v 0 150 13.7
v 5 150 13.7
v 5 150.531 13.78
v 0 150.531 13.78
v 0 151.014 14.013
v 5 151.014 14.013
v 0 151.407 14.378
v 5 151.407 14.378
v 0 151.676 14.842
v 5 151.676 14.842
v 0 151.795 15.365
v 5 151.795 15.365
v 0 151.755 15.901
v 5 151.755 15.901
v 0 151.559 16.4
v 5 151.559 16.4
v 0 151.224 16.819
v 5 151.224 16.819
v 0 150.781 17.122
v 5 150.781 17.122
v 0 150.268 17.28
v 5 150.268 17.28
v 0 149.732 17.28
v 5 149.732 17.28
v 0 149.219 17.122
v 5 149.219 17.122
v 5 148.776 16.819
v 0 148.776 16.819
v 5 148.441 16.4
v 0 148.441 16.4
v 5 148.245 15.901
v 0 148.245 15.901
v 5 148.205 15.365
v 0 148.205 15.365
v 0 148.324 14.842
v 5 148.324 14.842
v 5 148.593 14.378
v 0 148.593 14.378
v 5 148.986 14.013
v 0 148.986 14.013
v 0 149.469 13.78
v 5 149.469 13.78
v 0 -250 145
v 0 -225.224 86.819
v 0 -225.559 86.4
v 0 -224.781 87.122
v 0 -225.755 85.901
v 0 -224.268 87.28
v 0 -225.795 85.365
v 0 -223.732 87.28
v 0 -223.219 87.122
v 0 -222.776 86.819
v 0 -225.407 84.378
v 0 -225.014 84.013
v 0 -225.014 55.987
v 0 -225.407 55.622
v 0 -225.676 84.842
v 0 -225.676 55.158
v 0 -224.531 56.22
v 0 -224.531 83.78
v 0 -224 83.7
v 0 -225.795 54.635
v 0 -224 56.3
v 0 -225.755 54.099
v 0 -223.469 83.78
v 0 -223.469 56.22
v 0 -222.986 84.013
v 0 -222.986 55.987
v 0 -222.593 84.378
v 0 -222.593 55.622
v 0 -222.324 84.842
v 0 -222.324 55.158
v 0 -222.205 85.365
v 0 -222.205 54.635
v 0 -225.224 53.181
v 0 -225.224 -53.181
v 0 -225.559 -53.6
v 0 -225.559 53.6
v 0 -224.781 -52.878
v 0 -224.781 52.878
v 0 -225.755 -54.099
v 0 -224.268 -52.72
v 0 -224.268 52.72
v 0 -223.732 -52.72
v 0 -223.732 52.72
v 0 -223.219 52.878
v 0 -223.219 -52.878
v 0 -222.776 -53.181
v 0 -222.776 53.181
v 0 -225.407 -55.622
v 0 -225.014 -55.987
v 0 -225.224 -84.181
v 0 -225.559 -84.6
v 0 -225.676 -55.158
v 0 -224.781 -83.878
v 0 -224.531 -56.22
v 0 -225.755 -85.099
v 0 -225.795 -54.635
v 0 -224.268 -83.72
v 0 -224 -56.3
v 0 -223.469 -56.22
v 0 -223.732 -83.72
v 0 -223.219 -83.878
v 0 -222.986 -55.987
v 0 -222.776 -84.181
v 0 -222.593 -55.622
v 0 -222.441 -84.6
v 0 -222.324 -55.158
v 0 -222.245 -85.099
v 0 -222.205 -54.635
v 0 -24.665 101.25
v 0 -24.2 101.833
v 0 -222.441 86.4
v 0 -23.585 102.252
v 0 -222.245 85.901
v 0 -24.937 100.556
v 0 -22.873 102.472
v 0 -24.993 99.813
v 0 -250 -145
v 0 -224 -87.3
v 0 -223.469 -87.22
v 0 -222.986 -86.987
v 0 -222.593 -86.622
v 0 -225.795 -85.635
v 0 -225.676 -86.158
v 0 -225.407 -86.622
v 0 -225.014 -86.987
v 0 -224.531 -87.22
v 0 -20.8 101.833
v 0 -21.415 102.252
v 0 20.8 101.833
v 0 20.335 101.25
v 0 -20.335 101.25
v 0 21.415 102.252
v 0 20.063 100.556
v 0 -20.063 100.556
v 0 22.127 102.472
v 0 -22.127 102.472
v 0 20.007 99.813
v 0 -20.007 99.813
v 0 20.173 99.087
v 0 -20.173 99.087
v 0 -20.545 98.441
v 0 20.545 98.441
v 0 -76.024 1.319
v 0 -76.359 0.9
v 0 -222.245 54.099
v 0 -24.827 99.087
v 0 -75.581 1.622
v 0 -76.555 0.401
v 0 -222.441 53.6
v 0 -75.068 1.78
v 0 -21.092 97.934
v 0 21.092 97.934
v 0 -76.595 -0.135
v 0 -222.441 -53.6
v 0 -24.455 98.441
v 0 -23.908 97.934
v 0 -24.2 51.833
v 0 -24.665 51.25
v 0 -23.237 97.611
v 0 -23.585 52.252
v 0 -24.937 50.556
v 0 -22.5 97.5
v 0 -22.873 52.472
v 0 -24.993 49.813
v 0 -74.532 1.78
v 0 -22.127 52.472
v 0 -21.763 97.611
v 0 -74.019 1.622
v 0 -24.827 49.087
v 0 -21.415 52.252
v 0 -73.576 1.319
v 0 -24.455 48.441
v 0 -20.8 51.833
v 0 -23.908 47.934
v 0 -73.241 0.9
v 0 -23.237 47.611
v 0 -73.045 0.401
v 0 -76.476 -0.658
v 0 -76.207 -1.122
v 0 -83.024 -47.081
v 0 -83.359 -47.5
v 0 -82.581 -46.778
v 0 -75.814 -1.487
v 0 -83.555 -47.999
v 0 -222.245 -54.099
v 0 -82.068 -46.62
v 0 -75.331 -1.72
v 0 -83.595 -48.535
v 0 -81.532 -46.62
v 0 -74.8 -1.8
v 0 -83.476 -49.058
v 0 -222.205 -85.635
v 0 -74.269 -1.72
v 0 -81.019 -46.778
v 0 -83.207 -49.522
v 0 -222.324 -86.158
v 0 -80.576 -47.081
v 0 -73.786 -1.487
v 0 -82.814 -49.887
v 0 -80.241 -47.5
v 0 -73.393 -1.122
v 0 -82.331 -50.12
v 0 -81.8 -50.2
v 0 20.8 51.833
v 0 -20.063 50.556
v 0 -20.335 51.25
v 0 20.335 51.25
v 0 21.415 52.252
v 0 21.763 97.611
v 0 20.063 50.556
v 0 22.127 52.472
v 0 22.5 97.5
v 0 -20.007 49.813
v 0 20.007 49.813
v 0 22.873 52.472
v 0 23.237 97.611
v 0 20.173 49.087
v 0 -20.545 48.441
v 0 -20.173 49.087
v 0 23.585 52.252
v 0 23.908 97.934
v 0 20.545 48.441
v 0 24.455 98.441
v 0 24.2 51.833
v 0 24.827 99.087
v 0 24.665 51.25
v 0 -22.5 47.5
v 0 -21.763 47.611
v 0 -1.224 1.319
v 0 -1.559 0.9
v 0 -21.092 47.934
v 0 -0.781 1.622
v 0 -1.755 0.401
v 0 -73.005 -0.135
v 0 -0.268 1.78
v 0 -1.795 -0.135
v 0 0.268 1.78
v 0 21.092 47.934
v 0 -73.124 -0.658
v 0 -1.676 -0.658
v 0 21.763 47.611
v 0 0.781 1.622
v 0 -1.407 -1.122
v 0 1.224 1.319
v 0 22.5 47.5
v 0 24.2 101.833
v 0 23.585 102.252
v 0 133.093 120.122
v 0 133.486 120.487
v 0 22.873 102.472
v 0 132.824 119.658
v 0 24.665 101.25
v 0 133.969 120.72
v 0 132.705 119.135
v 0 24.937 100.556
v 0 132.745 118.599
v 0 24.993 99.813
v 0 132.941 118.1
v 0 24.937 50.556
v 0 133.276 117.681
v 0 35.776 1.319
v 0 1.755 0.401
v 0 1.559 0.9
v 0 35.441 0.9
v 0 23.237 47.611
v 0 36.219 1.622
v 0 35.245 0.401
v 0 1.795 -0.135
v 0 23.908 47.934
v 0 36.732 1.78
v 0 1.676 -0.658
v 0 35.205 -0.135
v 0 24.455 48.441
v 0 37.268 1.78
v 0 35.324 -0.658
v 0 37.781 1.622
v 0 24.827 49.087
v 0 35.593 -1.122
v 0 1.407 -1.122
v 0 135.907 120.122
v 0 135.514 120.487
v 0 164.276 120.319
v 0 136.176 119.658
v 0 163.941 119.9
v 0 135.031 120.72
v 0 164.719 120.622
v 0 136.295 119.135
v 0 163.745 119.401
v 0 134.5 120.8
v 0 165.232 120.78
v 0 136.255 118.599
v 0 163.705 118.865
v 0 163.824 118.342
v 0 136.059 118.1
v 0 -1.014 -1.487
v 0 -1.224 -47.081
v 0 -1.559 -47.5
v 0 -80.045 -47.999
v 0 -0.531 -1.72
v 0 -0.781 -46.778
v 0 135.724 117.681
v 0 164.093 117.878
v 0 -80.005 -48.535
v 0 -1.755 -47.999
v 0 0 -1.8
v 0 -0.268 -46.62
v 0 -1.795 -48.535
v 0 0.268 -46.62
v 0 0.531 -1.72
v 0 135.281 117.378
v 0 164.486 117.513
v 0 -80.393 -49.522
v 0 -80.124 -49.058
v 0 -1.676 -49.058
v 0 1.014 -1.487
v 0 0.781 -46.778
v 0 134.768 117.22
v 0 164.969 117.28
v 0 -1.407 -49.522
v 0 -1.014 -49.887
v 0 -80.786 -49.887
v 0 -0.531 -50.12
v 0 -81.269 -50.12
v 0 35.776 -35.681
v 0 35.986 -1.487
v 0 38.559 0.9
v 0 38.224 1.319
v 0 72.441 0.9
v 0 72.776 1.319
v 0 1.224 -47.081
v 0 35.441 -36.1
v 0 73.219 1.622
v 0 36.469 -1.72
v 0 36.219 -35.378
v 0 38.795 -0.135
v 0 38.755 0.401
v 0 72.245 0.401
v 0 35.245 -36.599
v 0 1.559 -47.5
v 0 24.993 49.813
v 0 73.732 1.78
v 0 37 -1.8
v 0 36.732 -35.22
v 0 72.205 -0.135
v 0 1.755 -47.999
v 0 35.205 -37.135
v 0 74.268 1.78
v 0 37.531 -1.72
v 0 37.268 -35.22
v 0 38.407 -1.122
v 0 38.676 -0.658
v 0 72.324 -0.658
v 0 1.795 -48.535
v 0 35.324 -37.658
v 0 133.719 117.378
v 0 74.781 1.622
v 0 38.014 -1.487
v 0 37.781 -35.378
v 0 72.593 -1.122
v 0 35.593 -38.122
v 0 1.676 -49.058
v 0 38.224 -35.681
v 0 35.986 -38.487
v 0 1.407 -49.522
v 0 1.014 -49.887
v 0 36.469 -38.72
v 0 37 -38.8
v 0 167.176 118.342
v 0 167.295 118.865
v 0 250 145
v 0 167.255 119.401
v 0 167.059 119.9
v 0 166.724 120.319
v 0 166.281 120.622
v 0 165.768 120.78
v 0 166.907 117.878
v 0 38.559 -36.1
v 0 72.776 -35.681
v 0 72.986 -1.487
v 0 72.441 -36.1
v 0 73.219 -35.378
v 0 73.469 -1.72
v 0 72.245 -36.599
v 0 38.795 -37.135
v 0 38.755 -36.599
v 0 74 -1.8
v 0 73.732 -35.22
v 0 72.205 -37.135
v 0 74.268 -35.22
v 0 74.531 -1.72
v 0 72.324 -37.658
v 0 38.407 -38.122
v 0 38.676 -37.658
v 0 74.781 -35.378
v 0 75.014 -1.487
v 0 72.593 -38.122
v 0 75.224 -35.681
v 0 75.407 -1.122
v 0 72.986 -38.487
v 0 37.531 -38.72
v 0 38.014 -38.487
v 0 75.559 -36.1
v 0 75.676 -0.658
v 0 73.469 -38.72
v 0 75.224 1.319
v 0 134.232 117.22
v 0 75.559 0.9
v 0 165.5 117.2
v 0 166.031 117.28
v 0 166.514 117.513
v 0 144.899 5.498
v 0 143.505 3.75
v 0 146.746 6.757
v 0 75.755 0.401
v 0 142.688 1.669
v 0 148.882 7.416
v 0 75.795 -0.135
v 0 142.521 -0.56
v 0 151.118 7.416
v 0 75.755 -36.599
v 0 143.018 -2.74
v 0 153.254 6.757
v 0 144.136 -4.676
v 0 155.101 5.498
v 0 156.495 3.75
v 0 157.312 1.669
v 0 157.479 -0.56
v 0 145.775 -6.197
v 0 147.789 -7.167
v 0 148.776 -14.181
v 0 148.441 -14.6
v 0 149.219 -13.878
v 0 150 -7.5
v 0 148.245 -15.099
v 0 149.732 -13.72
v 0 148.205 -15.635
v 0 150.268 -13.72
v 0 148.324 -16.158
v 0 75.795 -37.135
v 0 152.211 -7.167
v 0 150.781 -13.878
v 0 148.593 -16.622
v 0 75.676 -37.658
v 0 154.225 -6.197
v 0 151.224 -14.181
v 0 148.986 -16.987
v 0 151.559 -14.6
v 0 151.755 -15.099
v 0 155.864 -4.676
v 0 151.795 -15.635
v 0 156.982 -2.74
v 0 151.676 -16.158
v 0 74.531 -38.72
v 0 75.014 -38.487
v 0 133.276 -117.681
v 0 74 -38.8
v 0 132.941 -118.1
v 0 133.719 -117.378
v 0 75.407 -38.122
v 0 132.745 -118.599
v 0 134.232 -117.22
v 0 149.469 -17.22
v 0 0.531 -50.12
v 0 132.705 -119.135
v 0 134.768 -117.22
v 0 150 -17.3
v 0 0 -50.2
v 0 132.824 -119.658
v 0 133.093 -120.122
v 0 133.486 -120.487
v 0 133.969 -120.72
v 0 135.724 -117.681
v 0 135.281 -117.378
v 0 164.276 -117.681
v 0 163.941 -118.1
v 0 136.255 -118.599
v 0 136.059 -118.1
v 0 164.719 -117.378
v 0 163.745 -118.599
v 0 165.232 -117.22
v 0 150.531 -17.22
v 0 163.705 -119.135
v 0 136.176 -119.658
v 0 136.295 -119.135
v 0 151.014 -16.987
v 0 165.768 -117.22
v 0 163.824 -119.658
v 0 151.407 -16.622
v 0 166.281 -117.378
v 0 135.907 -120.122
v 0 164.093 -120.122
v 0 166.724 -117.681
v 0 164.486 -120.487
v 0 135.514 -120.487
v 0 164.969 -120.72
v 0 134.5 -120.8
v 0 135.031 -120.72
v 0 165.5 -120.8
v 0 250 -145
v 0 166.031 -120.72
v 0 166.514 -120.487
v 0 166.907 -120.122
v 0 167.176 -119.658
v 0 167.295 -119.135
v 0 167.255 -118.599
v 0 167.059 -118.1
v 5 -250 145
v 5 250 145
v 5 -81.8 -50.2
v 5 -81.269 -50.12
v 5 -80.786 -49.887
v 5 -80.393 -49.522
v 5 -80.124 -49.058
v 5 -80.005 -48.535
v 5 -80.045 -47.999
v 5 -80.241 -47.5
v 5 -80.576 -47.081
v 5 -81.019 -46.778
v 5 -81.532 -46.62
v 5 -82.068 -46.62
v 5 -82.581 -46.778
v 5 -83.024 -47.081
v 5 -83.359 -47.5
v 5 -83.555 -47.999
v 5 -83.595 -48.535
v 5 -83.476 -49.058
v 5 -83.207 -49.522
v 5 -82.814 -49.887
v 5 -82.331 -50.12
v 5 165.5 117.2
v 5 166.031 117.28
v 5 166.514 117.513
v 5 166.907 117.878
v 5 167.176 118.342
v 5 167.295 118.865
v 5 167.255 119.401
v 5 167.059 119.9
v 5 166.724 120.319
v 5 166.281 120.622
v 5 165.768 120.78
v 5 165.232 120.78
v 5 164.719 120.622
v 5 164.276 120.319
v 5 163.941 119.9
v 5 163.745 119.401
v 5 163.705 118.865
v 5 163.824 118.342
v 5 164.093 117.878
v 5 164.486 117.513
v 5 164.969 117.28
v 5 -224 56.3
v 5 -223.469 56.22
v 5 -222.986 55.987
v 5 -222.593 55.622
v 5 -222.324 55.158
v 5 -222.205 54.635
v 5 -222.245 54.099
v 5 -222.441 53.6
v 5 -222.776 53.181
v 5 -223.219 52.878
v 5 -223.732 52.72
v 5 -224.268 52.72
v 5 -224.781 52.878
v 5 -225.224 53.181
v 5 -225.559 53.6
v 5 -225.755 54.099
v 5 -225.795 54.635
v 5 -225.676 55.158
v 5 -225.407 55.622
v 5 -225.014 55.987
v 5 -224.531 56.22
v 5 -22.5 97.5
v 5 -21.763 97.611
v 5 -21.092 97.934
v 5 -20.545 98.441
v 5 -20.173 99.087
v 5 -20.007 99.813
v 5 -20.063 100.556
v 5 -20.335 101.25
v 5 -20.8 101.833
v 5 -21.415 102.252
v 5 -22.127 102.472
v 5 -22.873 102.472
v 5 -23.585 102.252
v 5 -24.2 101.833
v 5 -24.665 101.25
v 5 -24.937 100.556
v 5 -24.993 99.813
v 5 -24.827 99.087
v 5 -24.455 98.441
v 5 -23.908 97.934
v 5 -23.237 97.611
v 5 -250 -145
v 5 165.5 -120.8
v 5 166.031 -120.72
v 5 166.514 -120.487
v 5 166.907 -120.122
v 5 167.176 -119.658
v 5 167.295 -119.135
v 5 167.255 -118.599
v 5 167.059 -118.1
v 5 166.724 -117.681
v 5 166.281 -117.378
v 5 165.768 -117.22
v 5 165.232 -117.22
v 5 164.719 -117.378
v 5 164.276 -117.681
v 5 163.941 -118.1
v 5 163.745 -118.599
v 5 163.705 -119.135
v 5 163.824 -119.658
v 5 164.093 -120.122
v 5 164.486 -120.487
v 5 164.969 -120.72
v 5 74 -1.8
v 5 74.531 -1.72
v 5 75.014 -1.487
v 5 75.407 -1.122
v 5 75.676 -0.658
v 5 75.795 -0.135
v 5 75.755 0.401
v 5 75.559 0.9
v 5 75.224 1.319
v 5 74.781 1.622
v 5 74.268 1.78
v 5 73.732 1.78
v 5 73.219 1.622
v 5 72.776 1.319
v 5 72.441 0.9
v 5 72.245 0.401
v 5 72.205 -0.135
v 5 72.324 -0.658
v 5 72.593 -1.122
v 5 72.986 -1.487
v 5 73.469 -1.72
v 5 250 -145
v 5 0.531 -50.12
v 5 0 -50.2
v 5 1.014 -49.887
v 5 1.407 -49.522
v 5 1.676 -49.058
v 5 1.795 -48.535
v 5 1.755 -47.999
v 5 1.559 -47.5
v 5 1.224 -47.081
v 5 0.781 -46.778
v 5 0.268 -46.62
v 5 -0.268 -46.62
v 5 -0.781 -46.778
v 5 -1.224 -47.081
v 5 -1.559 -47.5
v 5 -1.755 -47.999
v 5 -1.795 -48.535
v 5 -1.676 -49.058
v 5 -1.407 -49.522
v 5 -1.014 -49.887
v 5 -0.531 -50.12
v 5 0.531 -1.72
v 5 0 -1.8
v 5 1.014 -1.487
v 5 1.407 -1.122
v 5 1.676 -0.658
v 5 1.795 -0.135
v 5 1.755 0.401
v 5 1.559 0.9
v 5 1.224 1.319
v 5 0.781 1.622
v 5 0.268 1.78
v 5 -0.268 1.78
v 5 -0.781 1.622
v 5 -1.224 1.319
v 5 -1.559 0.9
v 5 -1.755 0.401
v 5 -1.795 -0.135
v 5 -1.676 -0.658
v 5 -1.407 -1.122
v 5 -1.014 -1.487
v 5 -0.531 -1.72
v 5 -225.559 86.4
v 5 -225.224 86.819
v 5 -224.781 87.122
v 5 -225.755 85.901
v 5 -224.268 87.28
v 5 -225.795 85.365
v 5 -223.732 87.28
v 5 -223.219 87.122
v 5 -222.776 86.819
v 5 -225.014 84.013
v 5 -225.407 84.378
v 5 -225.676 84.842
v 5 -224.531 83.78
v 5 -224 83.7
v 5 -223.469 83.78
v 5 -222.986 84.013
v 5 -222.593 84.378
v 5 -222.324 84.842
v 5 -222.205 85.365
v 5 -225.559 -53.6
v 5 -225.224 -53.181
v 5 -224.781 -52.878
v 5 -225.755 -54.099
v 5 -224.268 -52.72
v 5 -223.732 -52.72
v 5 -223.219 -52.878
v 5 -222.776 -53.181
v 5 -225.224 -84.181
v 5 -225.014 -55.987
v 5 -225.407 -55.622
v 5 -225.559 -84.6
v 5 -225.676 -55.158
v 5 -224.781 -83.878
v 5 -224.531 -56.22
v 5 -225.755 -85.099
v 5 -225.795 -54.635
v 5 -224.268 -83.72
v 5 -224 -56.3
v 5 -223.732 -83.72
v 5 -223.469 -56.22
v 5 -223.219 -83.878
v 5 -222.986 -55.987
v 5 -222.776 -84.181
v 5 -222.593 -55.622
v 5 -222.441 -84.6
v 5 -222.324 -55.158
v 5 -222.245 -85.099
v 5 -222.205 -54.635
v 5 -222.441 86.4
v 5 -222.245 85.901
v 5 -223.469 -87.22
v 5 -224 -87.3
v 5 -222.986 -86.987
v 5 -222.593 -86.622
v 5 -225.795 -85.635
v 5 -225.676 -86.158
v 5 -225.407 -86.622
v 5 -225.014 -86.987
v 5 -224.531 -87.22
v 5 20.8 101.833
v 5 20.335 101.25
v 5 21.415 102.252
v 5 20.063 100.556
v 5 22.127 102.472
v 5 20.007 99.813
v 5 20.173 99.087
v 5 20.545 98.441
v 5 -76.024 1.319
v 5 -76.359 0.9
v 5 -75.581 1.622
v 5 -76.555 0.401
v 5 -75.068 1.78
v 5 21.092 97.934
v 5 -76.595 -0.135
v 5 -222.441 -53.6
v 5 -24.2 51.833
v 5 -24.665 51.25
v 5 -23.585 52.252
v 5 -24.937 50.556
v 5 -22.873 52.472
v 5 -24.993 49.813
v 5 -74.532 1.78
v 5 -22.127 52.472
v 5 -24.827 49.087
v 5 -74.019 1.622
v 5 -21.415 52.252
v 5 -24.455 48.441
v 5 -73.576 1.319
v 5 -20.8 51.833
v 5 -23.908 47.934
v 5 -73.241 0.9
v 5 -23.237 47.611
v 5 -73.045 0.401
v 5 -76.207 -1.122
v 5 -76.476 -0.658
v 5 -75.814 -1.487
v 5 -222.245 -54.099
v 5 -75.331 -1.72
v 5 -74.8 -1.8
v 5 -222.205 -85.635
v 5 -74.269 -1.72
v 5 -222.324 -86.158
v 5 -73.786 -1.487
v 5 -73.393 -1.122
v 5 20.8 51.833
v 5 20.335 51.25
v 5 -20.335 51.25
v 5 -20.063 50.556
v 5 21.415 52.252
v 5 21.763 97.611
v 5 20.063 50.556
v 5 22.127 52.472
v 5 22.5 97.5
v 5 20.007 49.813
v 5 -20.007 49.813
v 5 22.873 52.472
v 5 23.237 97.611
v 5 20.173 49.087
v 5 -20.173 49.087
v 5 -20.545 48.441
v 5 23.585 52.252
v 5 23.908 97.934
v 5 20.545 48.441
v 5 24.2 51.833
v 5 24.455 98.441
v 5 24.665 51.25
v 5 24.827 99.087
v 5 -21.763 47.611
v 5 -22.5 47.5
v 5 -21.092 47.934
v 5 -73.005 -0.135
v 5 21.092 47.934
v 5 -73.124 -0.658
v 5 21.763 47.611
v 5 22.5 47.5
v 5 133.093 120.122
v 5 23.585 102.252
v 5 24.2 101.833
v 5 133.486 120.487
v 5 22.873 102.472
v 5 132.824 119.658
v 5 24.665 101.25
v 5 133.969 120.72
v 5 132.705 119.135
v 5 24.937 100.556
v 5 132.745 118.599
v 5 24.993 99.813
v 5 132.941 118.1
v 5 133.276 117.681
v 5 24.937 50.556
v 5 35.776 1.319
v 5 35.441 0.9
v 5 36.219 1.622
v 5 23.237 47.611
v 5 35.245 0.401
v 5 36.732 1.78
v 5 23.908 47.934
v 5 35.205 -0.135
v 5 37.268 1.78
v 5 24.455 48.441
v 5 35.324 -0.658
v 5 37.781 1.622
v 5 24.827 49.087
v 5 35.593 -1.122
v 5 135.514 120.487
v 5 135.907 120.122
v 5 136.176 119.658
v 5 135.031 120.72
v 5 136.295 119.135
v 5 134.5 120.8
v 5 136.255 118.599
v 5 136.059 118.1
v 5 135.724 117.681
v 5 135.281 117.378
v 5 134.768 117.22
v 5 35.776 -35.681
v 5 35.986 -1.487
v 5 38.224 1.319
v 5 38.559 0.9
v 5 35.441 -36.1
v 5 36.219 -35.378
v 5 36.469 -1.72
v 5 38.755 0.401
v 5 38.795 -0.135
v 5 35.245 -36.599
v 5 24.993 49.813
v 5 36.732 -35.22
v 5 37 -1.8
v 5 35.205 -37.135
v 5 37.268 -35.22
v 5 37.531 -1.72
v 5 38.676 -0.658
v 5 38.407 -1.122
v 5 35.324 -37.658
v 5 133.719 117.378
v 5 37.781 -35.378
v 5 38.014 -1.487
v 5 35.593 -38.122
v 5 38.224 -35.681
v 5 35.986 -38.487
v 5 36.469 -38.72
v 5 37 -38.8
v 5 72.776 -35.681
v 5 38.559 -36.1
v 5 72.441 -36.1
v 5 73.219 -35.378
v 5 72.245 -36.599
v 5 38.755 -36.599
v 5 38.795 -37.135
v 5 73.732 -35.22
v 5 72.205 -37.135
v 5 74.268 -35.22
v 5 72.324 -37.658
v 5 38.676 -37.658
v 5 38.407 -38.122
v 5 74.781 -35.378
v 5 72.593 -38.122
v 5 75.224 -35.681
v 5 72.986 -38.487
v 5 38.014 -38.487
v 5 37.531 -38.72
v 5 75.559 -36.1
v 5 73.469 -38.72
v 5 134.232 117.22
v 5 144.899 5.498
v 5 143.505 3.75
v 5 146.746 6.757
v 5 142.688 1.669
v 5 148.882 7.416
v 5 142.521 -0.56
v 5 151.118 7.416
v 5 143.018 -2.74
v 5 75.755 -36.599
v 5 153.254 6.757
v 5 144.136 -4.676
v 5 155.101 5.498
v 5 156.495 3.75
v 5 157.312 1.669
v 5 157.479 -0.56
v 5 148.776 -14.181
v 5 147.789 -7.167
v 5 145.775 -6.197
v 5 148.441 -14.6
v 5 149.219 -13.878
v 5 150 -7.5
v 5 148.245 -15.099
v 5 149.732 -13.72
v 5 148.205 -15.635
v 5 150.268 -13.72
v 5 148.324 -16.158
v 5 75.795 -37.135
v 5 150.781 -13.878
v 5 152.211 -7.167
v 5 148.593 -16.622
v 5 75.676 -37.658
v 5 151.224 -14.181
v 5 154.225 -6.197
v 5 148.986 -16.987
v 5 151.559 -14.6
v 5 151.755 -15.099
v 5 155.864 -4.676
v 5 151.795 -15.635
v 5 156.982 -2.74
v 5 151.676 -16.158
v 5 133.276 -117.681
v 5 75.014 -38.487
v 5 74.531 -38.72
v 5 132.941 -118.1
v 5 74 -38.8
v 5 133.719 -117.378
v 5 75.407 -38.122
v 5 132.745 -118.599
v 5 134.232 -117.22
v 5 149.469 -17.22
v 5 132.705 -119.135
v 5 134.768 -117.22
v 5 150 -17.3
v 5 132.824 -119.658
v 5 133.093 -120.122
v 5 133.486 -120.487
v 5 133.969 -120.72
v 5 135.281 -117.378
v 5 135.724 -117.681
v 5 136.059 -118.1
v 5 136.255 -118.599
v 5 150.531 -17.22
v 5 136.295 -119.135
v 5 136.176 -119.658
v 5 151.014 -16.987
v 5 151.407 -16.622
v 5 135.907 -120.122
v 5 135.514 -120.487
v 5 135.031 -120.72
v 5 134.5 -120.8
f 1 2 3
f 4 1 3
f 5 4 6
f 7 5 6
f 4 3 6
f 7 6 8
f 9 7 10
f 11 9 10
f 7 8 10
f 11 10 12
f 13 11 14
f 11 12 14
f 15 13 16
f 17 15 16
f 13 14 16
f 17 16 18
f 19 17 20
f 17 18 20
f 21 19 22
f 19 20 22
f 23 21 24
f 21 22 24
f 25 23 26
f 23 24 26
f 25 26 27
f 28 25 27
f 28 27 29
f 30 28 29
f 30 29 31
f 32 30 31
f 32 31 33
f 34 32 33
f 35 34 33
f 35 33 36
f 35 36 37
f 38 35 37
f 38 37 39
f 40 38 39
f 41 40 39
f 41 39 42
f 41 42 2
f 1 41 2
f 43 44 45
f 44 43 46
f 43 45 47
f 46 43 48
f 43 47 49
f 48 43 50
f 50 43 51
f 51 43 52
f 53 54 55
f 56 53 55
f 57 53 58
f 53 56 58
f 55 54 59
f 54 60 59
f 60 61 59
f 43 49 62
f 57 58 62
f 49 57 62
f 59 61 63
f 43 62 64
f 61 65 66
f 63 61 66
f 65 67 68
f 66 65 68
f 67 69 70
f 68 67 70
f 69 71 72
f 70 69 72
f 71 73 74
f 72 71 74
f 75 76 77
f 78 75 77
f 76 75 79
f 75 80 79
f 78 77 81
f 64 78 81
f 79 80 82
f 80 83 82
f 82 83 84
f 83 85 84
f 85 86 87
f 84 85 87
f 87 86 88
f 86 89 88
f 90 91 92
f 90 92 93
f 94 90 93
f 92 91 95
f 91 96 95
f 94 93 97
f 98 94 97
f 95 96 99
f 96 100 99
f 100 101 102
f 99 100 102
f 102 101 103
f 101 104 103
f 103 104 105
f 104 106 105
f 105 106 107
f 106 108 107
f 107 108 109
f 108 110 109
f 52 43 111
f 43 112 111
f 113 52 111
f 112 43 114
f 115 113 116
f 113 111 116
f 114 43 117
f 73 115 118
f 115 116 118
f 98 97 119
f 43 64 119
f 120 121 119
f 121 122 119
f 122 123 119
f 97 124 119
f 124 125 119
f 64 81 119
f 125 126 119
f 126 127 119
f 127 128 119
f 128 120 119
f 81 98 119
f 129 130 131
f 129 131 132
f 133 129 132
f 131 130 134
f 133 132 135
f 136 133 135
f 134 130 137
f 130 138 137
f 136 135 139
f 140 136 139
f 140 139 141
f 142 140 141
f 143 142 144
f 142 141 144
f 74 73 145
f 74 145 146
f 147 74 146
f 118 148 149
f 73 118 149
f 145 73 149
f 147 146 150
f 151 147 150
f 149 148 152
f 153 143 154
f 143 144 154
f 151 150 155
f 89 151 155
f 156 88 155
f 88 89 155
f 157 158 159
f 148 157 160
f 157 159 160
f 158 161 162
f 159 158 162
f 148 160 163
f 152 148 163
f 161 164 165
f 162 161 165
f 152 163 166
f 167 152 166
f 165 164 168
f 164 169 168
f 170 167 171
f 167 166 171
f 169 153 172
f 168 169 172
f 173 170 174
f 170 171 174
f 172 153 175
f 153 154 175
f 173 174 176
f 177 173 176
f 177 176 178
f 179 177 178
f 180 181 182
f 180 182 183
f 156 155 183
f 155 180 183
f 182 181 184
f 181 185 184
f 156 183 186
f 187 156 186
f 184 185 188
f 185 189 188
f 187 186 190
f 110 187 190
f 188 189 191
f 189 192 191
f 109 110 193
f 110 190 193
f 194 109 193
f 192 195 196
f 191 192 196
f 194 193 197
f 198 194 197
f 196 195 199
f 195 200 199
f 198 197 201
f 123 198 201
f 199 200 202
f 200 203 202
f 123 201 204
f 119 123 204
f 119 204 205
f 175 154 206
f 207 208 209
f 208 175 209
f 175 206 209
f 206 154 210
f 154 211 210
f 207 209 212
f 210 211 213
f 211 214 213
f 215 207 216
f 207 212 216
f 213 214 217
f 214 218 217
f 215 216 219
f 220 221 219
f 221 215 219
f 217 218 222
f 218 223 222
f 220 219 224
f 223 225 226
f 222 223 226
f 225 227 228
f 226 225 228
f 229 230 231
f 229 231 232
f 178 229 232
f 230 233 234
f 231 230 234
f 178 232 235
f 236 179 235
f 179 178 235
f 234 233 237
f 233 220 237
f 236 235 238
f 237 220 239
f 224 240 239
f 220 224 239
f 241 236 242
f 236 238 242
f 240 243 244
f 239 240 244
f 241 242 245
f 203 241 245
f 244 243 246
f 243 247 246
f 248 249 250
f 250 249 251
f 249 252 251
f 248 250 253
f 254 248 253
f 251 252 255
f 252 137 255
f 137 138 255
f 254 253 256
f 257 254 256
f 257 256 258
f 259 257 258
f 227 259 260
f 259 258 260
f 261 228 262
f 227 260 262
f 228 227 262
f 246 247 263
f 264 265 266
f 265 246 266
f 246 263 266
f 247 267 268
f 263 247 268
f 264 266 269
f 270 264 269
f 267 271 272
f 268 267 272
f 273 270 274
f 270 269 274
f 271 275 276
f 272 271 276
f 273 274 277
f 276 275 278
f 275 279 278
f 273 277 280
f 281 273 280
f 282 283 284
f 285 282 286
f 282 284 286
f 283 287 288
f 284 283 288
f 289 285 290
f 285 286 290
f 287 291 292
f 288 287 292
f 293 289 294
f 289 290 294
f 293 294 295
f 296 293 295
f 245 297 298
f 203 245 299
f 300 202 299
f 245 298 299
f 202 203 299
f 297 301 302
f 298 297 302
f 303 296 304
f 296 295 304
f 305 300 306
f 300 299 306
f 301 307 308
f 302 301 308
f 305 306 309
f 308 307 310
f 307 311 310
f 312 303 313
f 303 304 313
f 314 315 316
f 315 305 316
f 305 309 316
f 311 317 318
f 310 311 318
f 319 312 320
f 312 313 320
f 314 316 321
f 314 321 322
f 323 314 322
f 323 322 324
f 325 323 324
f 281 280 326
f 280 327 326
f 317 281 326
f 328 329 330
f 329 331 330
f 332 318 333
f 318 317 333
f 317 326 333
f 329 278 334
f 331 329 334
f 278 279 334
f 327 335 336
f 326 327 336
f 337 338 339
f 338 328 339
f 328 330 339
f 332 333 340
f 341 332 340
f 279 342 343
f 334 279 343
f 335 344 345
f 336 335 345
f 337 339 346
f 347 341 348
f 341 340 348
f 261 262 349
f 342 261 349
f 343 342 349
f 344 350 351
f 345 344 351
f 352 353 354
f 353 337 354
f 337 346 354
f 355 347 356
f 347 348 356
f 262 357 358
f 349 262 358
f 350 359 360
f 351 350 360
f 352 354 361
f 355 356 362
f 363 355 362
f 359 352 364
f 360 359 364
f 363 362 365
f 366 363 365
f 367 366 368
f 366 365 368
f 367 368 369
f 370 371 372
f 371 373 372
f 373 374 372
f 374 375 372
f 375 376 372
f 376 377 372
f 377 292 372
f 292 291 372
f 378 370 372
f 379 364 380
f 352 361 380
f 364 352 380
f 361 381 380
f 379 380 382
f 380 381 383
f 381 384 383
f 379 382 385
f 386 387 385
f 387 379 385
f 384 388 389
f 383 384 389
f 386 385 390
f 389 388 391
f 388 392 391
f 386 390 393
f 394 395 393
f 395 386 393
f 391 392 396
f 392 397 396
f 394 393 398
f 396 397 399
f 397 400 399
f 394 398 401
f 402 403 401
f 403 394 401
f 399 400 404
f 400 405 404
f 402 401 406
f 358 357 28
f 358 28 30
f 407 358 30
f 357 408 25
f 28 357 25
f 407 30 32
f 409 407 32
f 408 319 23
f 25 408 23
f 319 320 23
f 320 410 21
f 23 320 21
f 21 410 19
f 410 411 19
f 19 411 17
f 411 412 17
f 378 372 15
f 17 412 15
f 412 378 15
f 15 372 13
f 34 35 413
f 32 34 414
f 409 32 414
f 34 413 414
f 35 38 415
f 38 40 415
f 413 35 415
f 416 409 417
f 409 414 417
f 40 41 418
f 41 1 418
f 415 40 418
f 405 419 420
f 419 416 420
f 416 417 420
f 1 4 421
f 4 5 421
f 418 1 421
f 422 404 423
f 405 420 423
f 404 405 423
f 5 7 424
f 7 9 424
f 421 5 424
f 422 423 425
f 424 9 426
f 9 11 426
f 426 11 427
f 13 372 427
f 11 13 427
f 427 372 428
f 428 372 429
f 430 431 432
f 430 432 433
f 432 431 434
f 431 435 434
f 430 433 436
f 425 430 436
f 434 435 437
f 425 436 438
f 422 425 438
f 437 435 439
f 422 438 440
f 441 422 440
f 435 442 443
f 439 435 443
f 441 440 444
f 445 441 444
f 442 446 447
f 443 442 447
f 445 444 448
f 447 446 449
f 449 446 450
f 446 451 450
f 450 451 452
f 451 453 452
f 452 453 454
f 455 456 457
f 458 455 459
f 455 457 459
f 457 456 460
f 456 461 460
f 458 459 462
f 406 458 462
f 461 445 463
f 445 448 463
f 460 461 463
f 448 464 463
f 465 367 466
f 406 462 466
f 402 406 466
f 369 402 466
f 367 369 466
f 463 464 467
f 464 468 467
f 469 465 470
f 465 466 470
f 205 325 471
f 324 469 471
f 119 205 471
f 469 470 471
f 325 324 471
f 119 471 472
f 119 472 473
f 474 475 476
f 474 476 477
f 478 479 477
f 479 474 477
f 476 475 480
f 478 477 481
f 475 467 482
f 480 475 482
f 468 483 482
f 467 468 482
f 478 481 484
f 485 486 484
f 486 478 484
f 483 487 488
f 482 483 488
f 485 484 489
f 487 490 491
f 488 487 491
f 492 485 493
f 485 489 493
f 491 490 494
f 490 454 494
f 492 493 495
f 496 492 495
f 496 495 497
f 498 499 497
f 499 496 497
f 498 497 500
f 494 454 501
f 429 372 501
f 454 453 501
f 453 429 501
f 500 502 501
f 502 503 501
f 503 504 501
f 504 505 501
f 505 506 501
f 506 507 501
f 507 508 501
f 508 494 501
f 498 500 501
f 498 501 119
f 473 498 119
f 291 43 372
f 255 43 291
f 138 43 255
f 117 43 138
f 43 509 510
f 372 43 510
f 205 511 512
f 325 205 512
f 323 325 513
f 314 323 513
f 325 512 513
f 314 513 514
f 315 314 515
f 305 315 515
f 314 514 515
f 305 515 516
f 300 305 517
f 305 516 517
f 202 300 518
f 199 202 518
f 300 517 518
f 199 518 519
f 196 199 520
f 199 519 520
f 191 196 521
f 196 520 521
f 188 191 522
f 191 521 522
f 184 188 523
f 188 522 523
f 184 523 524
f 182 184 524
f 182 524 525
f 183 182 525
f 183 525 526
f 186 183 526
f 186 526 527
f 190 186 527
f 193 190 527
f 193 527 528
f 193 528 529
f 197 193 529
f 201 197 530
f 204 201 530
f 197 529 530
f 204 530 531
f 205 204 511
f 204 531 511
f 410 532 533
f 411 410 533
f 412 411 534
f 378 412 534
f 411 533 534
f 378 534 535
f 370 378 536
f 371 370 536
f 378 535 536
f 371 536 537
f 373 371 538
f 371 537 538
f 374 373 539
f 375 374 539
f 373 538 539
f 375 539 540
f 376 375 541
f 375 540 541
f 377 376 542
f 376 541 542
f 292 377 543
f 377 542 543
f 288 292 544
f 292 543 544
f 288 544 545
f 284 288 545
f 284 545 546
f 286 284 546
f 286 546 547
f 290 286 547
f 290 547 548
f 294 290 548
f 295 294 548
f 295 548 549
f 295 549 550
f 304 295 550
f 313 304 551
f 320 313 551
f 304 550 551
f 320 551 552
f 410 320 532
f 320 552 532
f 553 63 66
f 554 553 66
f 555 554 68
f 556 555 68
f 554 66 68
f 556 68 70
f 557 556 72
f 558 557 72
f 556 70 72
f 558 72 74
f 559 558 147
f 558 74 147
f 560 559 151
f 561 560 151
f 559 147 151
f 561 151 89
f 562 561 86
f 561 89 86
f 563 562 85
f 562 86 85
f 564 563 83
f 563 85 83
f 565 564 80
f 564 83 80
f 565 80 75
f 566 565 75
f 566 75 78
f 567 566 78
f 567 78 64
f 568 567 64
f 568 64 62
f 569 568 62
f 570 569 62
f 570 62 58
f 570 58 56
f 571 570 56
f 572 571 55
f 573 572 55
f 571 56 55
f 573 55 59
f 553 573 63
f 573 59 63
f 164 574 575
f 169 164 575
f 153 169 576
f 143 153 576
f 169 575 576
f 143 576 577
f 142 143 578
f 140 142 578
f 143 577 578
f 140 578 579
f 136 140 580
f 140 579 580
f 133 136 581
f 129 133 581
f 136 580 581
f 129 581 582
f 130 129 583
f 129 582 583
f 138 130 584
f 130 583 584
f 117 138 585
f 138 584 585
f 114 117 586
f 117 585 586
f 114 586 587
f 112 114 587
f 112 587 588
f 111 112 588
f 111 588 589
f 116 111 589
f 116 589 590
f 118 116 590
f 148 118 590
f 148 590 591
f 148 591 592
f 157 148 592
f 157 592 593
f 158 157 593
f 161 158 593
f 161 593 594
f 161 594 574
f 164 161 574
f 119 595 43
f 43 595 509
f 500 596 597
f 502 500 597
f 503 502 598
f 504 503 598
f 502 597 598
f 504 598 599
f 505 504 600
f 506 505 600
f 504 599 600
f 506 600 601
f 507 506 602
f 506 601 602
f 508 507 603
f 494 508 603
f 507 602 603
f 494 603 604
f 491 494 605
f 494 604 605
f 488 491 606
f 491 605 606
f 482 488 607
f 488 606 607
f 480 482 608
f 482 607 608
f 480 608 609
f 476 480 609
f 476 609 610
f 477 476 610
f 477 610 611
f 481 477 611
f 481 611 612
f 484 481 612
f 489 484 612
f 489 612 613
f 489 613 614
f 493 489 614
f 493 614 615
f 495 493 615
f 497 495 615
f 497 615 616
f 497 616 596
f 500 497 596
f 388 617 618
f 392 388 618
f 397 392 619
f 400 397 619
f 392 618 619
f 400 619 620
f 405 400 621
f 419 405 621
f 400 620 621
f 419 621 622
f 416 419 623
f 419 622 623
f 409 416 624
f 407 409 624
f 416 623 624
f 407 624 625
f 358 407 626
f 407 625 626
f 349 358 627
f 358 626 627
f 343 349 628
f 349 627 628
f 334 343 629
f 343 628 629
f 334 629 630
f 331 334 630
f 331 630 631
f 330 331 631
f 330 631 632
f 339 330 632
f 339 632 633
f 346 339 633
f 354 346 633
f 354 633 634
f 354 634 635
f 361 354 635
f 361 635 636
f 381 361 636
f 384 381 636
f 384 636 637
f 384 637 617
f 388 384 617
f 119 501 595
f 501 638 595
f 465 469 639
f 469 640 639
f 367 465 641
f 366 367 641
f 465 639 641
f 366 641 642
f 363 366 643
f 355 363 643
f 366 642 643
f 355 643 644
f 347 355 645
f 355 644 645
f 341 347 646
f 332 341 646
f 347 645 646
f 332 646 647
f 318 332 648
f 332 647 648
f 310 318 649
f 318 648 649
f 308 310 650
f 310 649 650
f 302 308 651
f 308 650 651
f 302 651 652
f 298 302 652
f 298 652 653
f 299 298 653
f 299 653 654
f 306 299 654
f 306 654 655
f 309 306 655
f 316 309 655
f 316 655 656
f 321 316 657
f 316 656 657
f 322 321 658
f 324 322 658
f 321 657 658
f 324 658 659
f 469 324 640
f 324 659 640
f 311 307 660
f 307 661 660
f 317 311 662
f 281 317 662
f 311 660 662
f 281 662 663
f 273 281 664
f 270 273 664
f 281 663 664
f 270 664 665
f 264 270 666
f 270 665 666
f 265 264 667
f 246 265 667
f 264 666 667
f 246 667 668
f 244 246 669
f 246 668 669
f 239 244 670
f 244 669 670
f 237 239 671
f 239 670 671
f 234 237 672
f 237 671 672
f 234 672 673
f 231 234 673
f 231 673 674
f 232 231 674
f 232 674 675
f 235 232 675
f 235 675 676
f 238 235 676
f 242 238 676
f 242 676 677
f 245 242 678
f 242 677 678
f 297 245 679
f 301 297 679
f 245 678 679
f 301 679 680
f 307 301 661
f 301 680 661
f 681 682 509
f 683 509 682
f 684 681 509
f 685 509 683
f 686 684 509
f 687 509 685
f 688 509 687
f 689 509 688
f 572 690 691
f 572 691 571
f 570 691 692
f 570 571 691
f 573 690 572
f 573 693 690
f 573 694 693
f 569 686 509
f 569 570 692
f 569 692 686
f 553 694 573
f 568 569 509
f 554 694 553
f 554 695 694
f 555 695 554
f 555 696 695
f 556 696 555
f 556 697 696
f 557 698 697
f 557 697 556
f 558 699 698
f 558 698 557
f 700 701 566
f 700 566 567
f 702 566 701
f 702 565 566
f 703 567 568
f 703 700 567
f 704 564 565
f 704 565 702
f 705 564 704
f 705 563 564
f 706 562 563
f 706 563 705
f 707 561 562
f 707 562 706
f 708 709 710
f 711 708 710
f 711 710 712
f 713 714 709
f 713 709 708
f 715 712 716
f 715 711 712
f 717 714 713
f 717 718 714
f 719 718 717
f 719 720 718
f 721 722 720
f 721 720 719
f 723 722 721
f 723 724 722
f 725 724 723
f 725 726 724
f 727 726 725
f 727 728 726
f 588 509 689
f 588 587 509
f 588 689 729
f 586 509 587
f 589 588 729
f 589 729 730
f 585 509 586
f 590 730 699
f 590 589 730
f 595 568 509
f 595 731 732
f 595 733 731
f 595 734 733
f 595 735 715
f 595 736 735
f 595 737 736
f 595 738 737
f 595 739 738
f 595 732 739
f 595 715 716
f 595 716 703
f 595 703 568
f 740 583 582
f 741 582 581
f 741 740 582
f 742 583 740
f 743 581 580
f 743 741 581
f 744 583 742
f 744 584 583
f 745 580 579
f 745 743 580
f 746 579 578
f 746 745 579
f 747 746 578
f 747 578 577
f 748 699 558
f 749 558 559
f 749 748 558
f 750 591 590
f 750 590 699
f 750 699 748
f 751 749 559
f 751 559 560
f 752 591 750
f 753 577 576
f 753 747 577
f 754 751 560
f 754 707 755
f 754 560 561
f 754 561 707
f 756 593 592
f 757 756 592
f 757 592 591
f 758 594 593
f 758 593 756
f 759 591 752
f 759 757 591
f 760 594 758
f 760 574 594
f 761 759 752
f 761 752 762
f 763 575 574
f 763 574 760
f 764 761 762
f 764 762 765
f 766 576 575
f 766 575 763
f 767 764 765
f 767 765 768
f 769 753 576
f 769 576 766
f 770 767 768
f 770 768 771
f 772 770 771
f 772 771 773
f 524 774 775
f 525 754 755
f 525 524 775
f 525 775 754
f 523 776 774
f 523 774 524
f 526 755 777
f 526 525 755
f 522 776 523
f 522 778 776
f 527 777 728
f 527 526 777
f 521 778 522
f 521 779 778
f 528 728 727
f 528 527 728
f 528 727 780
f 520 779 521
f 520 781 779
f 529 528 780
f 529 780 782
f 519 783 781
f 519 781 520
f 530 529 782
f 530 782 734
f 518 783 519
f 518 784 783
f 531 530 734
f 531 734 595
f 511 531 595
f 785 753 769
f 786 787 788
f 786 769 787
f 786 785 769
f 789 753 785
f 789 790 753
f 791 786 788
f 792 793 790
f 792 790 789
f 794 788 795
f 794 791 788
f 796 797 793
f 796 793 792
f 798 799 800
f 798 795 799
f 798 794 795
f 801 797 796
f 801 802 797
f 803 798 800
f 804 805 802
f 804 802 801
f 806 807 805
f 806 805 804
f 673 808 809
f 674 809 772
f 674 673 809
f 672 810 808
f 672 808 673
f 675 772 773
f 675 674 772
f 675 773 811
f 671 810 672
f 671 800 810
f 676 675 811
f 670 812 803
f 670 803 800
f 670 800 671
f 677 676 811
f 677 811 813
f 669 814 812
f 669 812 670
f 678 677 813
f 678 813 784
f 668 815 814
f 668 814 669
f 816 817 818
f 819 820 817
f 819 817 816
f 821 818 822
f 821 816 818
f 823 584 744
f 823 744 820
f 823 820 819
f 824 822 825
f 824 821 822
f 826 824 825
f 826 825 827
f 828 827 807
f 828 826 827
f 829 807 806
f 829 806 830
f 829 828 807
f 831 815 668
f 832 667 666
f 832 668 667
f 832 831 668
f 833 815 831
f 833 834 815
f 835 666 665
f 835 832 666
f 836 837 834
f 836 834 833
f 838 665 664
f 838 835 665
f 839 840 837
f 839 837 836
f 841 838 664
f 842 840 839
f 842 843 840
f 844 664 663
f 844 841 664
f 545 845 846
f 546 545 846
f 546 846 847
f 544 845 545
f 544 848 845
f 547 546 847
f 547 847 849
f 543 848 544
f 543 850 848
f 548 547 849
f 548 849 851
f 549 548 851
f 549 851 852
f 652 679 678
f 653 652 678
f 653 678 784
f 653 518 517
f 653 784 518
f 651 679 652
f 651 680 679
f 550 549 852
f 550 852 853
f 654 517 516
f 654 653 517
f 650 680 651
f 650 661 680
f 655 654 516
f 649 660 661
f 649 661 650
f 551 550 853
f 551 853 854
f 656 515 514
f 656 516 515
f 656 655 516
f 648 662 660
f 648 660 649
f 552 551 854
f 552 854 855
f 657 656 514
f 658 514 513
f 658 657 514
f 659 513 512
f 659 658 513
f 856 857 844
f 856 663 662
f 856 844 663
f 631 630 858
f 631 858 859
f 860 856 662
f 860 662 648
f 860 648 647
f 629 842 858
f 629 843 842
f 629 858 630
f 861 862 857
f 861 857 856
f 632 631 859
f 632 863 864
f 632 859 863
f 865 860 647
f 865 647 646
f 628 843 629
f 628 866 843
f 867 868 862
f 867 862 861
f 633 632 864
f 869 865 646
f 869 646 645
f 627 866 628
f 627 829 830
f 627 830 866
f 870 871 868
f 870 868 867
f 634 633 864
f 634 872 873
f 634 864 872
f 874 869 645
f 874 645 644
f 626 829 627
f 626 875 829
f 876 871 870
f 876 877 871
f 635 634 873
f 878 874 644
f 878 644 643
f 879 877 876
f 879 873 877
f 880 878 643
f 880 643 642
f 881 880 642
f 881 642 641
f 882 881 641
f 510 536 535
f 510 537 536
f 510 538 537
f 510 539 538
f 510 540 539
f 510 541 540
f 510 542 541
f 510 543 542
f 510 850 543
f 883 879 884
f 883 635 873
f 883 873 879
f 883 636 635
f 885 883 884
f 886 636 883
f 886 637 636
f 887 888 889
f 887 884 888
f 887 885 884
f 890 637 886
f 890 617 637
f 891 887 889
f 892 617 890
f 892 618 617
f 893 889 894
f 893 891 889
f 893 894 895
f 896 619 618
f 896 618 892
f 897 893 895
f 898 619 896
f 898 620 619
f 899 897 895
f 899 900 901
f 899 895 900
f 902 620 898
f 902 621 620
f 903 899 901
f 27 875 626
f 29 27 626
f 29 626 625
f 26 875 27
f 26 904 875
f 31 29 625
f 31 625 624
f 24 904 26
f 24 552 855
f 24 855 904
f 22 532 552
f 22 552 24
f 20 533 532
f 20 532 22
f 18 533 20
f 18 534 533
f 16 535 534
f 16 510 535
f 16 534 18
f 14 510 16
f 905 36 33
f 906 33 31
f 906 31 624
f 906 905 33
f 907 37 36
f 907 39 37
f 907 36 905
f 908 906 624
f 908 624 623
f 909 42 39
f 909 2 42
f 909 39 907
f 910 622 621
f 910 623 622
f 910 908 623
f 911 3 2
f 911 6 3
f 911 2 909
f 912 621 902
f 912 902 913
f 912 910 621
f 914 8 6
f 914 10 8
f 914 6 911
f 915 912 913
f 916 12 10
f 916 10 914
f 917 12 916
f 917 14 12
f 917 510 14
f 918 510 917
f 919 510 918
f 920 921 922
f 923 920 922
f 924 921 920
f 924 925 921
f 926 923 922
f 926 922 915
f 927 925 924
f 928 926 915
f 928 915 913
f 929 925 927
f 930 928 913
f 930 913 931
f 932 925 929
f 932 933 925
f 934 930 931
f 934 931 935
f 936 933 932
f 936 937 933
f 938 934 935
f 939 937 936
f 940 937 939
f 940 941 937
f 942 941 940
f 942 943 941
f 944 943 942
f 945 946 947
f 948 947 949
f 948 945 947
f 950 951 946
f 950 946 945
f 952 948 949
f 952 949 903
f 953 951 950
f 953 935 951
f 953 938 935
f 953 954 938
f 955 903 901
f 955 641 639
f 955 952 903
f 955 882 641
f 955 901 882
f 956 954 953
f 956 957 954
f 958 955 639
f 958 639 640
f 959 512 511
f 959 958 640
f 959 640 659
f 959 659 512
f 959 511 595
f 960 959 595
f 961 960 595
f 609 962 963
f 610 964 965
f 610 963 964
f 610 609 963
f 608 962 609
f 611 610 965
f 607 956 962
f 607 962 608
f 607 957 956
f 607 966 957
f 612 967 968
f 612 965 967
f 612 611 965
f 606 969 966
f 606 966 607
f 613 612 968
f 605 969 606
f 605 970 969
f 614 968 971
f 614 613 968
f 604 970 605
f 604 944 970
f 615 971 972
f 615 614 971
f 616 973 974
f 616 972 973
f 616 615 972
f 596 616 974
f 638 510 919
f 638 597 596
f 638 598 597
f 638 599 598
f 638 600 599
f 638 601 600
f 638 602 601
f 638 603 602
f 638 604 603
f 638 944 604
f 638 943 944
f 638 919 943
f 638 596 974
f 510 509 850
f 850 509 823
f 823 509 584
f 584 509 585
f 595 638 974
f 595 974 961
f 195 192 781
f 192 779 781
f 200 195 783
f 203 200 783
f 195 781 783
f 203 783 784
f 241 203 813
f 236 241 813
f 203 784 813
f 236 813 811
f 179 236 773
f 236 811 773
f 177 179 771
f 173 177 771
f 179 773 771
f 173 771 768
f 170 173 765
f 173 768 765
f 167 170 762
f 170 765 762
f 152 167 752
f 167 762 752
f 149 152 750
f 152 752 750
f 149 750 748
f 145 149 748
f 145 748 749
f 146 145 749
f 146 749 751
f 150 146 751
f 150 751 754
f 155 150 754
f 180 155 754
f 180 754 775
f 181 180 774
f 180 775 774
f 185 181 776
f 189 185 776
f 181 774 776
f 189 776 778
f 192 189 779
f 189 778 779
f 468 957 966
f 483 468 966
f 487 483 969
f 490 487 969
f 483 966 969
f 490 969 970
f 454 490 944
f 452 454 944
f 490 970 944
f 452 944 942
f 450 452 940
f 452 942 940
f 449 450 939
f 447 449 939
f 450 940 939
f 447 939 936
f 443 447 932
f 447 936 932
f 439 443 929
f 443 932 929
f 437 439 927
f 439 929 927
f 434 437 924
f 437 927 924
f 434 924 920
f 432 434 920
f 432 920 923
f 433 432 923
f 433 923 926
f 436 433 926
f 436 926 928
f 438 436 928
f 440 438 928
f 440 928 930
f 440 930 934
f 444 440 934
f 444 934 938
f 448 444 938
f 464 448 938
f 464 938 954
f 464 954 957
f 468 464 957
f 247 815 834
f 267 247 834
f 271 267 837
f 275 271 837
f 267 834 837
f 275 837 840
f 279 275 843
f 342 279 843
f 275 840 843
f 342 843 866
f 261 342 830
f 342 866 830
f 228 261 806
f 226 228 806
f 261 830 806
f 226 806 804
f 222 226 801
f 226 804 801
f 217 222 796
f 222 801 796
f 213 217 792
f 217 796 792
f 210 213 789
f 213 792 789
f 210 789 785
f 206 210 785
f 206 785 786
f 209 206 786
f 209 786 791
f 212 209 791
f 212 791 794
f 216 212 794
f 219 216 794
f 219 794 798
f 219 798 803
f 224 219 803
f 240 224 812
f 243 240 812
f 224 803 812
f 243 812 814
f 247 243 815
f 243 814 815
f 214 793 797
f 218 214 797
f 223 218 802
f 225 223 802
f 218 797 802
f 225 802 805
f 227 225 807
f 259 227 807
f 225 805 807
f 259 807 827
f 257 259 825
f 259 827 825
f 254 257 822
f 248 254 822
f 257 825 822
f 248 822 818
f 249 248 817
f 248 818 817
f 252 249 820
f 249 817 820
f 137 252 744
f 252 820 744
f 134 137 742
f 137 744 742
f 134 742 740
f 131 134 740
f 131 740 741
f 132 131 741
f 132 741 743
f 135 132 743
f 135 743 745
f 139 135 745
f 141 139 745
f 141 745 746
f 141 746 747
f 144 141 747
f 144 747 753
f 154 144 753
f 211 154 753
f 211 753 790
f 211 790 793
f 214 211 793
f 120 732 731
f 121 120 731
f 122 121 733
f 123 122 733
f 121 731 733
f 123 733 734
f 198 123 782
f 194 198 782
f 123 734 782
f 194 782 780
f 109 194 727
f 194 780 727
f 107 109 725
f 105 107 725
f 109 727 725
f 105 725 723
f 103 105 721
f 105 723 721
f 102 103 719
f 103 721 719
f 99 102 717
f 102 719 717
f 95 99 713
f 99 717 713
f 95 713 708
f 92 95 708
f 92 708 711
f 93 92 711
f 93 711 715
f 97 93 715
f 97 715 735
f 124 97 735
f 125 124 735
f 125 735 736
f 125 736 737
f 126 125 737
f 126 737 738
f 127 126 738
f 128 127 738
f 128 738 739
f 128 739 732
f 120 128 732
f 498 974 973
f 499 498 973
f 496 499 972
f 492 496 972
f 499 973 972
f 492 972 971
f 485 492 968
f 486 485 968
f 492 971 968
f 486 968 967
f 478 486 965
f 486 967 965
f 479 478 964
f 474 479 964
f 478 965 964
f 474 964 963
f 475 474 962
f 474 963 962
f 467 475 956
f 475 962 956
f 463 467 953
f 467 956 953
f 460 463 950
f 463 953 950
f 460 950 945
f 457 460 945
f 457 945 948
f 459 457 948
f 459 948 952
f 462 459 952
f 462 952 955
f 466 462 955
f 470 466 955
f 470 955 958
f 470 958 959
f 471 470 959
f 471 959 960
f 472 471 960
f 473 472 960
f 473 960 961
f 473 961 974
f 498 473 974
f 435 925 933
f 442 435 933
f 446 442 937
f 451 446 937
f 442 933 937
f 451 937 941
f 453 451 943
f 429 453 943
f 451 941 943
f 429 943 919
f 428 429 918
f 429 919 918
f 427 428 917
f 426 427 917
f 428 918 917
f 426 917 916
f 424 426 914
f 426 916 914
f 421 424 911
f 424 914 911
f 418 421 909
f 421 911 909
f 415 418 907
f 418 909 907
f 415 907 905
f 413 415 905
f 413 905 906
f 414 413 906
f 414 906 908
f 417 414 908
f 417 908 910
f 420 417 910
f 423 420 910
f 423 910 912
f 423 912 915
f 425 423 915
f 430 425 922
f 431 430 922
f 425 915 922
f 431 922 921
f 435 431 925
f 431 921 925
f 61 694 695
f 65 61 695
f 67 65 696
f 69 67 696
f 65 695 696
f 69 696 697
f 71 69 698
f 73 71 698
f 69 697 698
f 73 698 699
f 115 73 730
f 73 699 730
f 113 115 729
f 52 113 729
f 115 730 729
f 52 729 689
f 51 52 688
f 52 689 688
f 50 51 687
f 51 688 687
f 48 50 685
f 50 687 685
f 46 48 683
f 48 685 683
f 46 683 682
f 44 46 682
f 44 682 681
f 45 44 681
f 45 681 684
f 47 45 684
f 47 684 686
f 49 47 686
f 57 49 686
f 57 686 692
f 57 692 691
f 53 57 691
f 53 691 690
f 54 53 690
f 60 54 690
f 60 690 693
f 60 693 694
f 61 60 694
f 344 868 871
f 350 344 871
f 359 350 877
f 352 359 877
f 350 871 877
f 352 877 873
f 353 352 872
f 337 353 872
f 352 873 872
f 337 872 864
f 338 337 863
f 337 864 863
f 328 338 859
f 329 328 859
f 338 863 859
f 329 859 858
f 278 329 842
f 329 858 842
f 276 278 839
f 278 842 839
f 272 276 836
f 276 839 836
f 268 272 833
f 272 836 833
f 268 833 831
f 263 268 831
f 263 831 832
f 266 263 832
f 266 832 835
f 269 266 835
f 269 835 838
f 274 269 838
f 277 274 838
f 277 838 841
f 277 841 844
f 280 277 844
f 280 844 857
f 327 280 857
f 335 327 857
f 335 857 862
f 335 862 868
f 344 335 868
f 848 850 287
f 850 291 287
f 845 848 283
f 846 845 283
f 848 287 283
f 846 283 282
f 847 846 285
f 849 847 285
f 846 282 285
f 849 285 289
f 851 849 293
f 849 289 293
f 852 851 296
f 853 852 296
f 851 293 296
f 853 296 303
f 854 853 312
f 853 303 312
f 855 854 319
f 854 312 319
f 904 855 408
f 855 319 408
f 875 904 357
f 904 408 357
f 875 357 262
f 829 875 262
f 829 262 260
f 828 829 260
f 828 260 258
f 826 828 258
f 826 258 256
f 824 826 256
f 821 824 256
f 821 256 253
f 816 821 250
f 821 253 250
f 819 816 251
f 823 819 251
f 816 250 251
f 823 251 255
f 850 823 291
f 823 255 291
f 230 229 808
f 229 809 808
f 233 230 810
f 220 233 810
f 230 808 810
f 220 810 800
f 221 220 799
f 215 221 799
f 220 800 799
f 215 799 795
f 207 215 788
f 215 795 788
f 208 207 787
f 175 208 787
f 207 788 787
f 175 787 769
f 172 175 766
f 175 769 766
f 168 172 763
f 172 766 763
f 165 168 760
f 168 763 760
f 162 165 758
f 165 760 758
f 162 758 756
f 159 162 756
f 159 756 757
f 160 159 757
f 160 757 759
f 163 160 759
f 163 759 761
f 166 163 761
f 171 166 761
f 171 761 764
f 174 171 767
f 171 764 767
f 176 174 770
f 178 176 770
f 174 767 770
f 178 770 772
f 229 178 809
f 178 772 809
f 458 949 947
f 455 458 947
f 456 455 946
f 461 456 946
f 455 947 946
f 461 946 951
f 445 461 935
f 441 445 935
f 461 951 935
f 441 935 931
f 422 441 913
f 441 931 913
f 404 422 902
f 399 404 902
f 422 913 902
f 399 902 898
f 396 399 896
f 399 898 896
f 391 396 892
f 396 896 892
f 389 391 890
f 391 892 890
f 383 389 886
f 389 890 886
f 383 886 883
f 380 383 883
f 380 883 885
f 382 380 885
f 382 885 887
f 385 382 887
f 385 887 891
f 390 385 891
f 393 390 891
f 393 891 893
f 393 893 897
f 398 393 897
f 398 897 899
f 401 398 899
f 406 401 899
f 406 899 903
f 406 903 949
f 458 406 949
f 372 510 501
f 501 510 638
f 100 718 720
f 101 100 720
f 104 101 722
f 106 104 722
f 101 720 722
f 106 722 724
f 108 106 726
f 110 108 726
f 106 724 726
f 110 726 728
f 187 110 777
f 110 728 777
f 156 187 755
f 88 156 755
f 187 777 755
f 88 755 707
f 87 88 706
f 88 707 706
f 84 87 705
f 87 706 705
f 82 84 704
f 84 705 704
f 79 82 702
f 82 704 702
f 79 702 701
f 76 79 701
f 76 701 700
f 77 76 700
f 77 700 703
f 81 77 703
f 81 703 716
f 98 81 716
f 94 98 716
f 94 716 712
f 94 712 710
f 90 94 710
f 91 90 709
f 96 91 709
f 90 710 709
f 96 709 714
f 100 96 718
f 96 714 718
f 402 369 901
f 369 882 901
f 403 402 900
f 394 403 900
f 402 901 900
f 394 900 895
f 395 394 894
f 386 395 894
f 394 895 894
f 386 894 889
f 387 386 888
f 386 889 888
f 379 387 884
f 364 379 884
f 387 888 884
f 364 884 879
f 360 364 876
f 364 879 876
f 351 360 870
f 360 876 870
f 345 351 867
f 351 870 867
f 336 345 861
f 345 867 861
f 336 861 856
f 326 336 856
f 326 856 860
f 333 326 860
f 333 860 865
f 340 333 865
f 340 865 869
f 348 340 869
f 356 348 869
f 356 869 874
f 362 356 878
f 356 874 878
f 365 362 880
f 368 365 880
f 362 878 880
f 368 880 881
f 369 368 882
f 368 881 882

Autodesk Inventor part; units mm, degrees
ref_plane "YZ Plane" through (0, 0, 0) normal (1, 0, 0) x (0, 1, 0)
ref_plane "XZ Plane" through (0, 0, 0) normal (0, 1, 0) x (-1, 0, 0)
ref_plane "XY Plane" through (0, 0, 0) normal (0, 0, 1) x (1, 0, 0)
sketch "草图1" plane through (0, 0, 0) normal (1, 0, 0) x (0, 1, 0)
  line L0 (250, 140) -> (-250, 140)
  line L1 (-250, 140) -> (-250, -150)
  line L2 (-250, -150) -> (250, -150)
  line L3 (250, -150) -> (250, 140)
  point P0 (0, 0)
  dimension "d0" = 500
  dimension "d1" = 290
extrude "拉伸1" add sketch "草图1" along normal blind 5
sketch "草图2" plane through (5, 0, 0) normal (1, 0, 0) x (0, 0, -1)
  circle A0 centre (85.5, -224) radius 1.8
  point P0 (0, 0)
  dimension "d4" = 3.6
extrude "拉伸2" cut sketch "草图2" against normal through all
sketch "草图3" plane through (5, 0, 0) normal (1, 0, 0) x (0, 0, -1)
  circle A0 centre (-85.5, -224) radius 1.8
  point P0 (0, 0)
  dimension "d7" = 3.6
extrude "拉伸3" cut sketch "草图3" against normal through all
sketch "草图4" plane through (0, 0, 0) normal (-1, 0, 0) x (0, 0, 1)
  circle A0 centre (54.5, -224) radius 1.8
  point P0 (0, 0)
  dimension "d10" = 3.6
extrude "拉伸4" cut sketch "草图4" against normal through all
sketch "草图5" plane through (5, 0, 0) normal (1, 0, 0) x (0, 0, -1)
  circle A0 centre (54.5, -224) radius 1.8
  point P0 (0, 0)
  dimension "d13" = 3.6
extrude "拉伸5" cut sketch "草图5" against normal through all
sketch "草图8" plane through (5, 0, 0) normal (1, 0, 0) x (0, 0, -1)
  circle A0 centre (-119, 165.5) radius 1.8
  point P0 (0, 0)
  dimension "d22" = 3.6
extrude "拉伸8" cut sketch "草图8" against normal through all
sketch "草图9" plane through (0, 0, 0) normal (-1, 0, 0) x (0, 0, 1)
  circle A0 centre (119, 134.5) radius 1.8
  point P0 (0, 0)
  dimension "d25" = 3.6
extrude "拉伸9" cut sketch "草图9" against normal through all
sketch "草图10" plane through (5, 0, 0) normal (1, 0, 0) x (0, 0, -1)
  circle A0 centre (119, 134.5) radius 1.8
  point P0 (0, 0)
  dimension "d28" = 3.6
extrude "拉伸10" cut sketch "草图10" against normal through all
sketch "草图11" plane through (5, 0, 0) normal (1, 0, 0) x (0, 0, -1)
  circle A0 centre (119, 165.5) radius 1.8
  point P0 (0, 0)
  dimension "d31" = 3.6
extrude "拉伸11" cut sketch "草图11" against normal through all
sketch "草图12" plane through (5, 0, 0) normal (1, 0, 0) x (0, 0, -1)
  line L0 (145, -250) -> (150, -250)
  line L1 (150, -250) -> (150, 250)
  line L2 (150, 250) -> (145, 250)
  line L3 (145, 250) -> (145, -250)
  point P0 (0, 0)
  dimension "d34" = 5
  dimension "d35" = 500
extrude "拉伸12" cut sketch "草图12" against normal through all
sketch "草图13" plane through (5, 0, 0) normal (1, 0, 0) x (0, 0, -1)
  line L0 (-140, -250) -> (-145, -250)
  line L1 (-145, -250) -> (-145, 250)
  line L2 (-145, 250) -> (-140, 250)
  line L3 (-140, 250) -> (-140, -250)
  point P0 (0, 0)
  dimension "d38" = 5
  dimension "d39" = 500
extrude "拉伸13" add sketch "草图13" against normal blind 5
sketch "草图14" plane through (5, 0, 0) normal (1, 0, 0) x (0, 0, -1)
  circle A0 centre (0, 0) radius 1.8
  dimension "d42" = 3.6
extrude "拉伸14" cut sketch "草图14" against normal through all
sketch "草图15" plane through (5, 0, 0) normal (1, 0, 0) x (0, 0, -1)
  circle A0 centre (48.4, 0) radius 1.8
  point P0 (0, 0)
  dimension "d45" = 3.6
extrude "拉伸15" cut sketch "草图15" against normal through all
sketch "草图16" plane through (5, 0, 0) normal (1, 0, 0) x (0, 0, -1)
  circle A0 centre (0, -74.8) radius 1.8
  point P0 (0, 0)
  dimension "d48" = 3.6
extrude "拉伸16" cut sketch "草图16" against normal through all
sketch "草图17" plane through (5, 0, 0) normal (1, 0, 0) x (0, 0, -1)
  circle A0 centre (48.4, -81.8) radius 1.8
  point P0 (0, 0)
  dimension "d51" = 3.6
extrude "拉伸17" cut sketch "草图17" against normal through all
sketch "草图18" plane through (5, 0, 0) normal (1, 0, 0) x (0, 0, -1)
  circle A0 centre (0, 37) radius 1.8
  point P0 (0, 0)
  dimension "d54" = 3.6
extrude "拉伸18" cut sketch "草图18" against normal through all
sketch "草图19" plane through (5, 0, 0) normal (1, 0, 0) x (0, 0, -1)
  circle A0 centre (37, 74) radius 1.8
  point P0 (0, 0)
  dimension "d57" = 3.6
extrude "拉伸19" cut sketch "草图19" against normal through all
sketch "草图20" plane through (5, 0, 0) normal (1, 0, 0) x (0, 0, -1)
  circle A0 centre (0, 74) radius 1.8
  point P0 (0, 0)
  dimension "d60" = 3.6
extrude "拉伸20" cut sketch "草图20" against normal through all
sketch "草图21" plane through (5, 0, 0) normal (1, 0, 0) x (0, 0, -1)
  circle A0 centre (37, 37) radius 1.8
  point P0 (0, 0)
  dimension "d63" = 3.6
extrude "拉伸21" cut sketch "草图21" against normal through all
sketch "草图22" plane through (5, 0, 0) normal (1, 0, 0) x (0, 0, -1)
  circle A0 centre (-50, -22.5) radius 2.5
  point P0 (0, 0)
  dimension "d66" = 5
extrude "拉伸22" cut sketch "草图22" against normal through all
sketch "草图23" plane through (5, 0, 0) normal (1, 0, 0) x (0, 0, -1)
  circle A0 centre (-50, 22.5) radius 2.5
  point P0 (0, 0)
  dimension "d69" = 5
extrude "拉伸23" cut sketch "草图23" against normal through all
sketch "草图24" plane through (5, 0, 0) normal (1, 0, 0) x (0, 0, -1)
  circle A0 centre (-100, -22.5) radius 2.5
  point P0 (0, 0)
  dimension "d72" = 5
extrude "拉伸24" cut sketch "草图24" against normal through all
sketch "草图25" plane through (5, 0, 0) normal (1, 0, 0) x (0, 0, -1)
  circle A0 centre (-100, 22.5) radius 2.5
  point P0 (0, 0)
  dimension "d75" = 5
extrude "拉伸25" cut sketch "草图25" against normal through all
sketch "草图26" plane through (5, 0, 0) normal (1, 0, 0) x (0, 0, -1)
  circle A0 centre (15.5, 150) radius 1.8
  point P0 (0, 0)
  dimension "d78" = 3.6
extrude "拉伸26" cut sketch "草图26" against normal through all
sketch "草图27" plane through (5, 0, 0) normal (1, 0, 0) x (0, 0, -1)
  circle A0 centre (-15.5, 150) radius 1.8
  point P0 (0, 0)
  dimension "d81" = 3.6
extrude "拉伸27" cut sketch "草图27" against normal through all
sketch "草图28" plane through (5, 0, 0) normal (1, 0, 0) x (0, 0, -1)
  circle A0 centre (0, 150) radius 7.5
  point P0 (0, 0)
  dimension "d84" = 15
extrude "拉伸28" cut sketch "草图28" against normal through all
equation "\"折弯半径\" = 厚度"
equation "\"折弯释压宽度\" = 厚度"
equation "\"折弯释压深度\" = 0.5 * 厚度"
equation "\"拐角释压尺寸\" = 4 * 厚度"
equation "\"最小余量\" = 2 * 厚度"
equation "\"过渡半径\" = 折弯半径"
equation "\"Jacobi半径尺寸\" = 折弯半径"
equation "\"间隙大小\" = 厚度"
equation "\"厚度\" = 0.5"
properties part number "290mm板"
